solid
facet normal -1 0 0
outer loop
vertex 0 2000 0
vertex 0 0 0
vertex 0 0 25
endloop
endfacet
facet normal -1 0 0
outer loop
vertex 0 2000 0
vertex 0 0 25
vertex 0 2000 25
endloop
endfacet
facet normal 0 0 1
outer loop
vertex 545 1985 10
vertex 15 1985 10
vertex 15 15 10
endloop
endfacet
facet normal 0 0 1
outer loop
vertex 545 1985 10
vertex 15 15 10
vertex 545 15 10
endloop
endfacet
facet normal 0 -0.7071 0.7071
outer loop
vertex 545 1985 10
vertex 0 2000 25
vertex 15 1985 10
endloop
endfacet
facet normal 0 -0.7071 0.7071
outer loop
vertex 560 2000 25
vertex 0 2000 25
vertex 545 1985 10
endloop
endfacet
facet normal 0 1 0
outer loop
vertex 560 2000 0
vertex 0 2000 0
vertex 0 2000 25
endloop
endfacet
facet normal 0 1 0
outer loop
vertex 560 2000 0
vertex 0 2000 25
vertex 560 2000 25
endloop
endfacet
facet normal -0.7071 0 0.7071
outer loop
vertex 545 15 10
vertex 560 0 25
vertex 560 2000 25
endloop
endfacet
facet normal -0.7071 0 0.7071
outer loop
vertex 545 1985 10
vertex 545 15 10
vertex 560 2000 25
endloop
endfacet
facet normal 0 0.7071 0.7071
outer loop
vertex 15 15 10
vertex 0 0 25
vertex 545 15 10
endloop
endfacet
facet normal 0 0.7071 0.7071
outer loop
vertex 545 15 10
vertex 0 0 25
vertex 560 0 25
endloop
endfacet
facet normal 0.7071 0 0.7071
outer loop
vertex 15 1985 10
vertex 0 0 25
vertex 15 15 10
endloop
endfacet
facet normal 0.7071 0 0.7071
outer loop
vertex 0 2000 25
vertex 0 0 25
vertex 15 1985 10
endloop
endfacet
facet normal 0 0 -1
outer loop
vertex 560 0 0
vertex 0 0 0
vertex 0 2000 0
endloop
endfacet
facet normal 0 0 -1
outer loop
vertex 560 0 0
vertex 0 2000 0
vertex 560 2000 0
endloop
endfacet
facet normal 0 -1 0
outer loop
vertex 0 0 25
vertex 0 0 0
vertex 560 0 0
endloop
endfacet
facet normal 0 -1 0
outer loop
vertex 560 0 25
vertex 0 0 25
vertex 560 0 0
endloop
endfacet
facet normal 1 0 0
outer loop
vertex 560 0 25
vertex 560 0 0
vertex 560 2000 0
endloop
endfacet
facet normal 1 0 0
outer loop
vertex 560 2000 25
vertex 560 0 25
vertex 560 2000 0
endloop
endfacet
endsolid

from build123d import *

# Parameters (mm, degrees)
SKETCH2_W           = 560
SKETCH2_H           = 2000
BOSS_EXTRUDE1_DEPTH = 25
SKETCH4_W           = 560
SKETCH4_H           = 2000
CUT_EXTRUDE1_DEPTH  = 15
CUT_EXTRUDE1_DRAFT  = -45


with BuildPart() as part:
    # Sketch2 → Boss-Extrude1 (new body)
    with BuildSketch(Plane.XY):
        with Locations((280, 1000)):
            Rectangle(SKETCH2_W, SKETCH2_H)
    extrude(amount=BOSS_EXTRUDE1_DEPTH)


with BuildPart() as cut_extrude1_tool:
    # Sketch4 → Cut-Extrude1 (with draft: the straight prism first)
    with BuildSketch(Plane.XY.offset(25)):
        with Locations((280, 1000)):
            Rectangle(SKETCH4_W, SKETCH4_H)
    extrude(amount=-CUT_EXTRUDE1_DEPTH)
    # Cut-Extrude1: the draft: its side faces are tilted about the plane it starts from
    cut_extrude1_sides = [cut_extrude1_tool.faces().sort_by_distance(p)[0] for p in [
        (0, 1000, 17.5),
        (280, 0, 17.5),
        (560, 1000, 17.5),
        (280, 2000, 17.5),
    ]]
    draft(cut_extrude1_sides, Plane.XY.offset(25), CUT_EXTRUDE1_DRAFT)


with BuildPart() as part_1:
    add(part.part)

    # Cut-Extrude1: cut by cut_extrude1_tool
    add(cut_extrude1_tool.part, mode=Mode.SUBTRACT)


solid = part_1.part
